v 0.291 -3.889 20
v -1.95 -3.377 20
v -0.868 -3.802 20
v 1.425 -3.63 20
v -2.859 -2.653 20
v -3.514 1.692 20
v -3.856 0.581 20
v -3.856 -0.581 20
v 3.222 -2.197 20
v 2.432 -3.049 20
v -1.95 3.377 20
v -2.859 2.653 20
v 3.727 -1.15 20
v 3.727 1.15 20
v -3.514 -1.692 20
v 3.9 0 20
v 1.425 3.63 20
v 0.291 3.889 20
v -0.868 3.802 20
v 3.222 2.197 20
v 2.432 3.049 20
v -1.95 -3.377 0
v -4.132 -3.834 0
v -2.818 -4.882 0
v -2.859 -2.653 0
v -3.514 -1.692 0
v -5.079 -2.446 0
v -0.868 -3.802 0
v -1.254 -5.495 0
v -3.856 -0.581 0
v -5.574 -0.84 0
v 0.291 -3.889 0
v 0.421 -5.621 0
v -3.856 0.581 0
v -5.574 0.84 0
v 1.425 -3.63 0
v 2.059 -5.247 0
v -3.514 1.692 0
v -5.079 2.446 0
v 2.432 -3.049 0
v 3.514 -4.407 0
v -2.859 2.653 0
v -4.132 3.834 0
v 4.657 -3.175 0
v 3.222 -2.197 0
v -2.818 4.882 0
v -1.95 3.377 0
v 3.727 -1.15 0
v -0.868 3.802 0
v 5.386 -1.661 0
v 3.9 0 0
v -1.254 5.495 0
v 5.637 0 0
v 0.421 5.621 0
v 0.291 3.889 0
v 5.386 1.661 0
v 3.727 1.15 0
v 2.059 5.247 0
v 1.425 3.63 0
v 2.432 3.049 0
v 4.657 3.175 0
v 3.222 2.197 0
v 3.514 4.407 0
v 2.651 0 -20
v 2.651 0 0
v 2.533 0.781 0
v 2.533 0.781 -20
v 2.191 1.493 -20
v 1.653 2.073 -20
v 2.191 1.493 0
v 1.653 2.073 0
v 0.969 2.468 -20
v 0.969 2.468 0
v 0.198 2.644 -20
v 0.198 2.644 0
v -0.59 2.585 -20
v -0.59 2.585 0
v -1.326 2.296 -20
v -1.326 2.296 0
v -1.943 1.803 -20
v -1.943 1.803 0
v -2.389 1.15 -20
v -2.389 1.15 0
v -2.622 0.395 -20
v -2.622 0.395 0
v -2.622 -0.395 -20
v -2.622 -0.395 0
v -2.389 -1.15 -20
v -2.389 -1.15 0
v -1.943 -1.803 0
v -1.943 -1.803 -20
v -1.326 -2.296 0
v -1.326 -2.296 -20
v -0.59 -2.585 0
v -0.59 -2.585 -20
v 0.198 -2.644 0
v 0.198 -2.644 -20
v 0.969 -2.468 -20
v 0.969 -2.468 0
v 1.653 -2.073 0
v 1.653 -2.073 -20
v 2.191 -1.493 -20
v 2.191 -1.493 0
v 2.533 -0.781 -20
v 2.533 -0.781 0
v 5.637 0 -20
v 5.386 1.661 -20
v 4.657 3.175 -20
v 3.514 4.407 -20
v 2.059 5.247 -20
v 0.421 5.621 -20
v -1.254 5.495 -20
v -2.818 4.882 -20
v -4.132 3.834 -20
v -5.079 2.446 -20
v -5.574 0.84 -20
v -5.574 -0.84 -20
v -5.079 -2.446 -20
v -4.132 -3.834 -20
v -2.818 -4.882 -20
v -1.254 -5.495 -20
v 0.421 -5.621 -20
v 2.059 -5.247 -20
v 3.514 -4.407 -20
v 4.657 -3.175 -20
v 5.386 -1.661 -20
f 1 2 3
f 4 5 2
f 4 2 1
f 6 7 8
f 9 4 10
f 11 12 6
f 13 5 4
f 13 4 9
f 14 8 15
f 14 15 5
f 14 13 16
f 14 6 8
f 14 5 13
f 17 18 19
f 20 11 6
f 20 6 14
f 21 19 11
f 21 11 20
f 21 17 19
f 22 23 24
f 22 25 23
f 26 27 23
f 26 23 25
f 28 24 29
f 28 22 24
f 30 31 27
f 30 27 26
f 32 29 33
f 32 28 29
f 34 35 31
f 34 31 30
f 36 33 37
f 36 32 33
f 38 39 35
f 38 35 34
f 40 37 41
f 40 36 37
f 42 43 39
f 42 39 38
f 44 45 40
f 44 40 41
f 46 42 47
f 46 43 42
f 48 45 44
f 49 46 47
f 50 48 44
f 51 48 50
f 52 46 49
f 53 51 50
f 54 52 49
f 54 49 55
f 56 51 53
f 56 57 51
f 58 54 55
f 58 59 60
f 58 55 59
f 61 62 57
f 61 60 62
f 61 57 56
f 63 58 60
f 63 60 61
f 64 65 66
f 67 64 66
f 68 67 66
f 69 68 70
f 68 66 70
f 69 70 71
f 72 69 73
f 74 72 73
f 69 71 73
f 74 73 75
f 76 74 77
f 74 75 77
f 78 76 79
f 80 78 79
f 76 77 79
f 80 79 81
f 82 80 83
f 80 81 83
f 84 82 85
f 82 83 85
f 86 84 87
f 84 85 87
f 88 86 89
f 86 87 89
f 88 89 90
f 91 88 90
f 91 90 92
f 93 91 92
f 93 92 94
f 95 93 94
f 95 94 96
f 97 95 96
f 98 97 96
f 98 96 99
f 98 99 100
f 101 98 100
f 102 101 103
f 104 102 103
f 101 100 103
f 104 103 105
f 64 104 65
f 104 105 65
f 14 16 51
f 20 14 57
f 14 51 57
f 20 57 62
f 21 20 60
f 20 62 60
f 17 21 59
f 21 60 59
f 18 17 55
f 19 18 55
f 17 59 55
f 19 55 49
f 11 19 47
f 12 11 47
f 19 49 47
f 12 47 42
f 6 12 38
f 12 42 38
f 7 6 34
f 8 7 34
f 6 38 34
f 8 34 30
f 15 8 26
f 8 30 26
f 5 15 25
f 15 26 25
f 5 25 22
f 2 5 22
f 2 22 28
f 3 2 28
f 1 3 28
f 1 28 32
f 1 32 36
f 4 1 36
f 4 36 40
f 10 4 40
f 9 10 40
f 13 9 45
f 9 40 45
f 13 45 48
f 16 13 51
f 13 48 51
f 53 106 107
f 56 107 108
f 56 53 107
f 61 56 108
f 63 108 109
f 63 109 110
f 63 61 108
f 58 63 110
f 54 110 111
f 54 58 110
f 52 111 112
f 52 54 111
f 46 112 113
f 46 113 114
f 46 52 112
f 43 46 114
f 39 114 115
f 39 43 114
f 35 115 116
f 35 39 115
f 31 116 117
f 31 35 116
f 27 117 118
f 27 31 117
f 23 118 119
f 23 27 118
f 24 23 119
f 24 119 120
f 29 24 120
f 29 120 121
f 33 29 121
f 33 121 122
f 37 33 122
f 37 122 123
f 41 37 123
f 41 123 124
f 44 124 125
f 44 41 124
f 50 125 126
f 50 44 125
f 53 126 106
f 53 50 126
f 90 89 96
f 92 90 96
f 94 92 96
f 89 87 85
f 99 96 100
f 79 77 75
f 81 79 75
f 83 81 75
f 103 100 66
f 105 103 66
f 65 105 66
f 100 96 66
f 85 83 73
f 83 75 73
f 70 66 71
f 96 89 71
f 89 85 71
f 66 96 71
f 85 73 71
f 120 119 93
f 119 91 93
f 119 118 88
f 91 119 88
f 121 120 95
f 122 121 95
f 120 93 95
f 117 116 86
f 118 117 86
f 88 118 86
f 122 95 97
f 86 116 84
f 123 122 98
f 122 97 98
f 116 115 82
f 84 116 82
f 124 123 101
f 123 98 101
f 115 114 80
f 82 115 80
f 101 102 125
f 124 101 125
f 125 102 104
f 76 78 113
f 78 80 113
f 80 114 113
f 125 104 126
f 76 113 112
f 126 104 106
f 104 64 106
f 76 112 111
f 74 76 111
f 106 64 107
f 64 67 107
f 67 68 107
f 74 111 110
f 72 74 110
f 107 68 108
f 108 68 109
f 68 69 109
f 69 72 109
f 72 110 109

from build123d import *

# Parameters (mm, degrees)
SKETCH_1_R      = 3.9
EXTRUDE_1_DEPTH = 20
SKETCH_2_R      = 5.636785761
SKETCH_2_R_2    = 2.651196968
EXTRUDE_2_DEPTH = 20


with BuildPart() as part:
    # 스케치1 → 보스-돌출1 (new body)
    with BuildSketch(Plane.XY):
        Circle(SKETCH_1_R)
    extrude(amount=EXTRUDE_1_DEPTH)

    # 스케치2 → 보스-돌출2 (add)
    with BuildSketch(Plane.XY):
        Circle(SKETCH_2_R)
        Circle(SKETCH_2_R_2, mode=Mode.SUBTRACT)
    extrude(amount=-EXTRUDE_2_DEPTH)


solid = part.part
